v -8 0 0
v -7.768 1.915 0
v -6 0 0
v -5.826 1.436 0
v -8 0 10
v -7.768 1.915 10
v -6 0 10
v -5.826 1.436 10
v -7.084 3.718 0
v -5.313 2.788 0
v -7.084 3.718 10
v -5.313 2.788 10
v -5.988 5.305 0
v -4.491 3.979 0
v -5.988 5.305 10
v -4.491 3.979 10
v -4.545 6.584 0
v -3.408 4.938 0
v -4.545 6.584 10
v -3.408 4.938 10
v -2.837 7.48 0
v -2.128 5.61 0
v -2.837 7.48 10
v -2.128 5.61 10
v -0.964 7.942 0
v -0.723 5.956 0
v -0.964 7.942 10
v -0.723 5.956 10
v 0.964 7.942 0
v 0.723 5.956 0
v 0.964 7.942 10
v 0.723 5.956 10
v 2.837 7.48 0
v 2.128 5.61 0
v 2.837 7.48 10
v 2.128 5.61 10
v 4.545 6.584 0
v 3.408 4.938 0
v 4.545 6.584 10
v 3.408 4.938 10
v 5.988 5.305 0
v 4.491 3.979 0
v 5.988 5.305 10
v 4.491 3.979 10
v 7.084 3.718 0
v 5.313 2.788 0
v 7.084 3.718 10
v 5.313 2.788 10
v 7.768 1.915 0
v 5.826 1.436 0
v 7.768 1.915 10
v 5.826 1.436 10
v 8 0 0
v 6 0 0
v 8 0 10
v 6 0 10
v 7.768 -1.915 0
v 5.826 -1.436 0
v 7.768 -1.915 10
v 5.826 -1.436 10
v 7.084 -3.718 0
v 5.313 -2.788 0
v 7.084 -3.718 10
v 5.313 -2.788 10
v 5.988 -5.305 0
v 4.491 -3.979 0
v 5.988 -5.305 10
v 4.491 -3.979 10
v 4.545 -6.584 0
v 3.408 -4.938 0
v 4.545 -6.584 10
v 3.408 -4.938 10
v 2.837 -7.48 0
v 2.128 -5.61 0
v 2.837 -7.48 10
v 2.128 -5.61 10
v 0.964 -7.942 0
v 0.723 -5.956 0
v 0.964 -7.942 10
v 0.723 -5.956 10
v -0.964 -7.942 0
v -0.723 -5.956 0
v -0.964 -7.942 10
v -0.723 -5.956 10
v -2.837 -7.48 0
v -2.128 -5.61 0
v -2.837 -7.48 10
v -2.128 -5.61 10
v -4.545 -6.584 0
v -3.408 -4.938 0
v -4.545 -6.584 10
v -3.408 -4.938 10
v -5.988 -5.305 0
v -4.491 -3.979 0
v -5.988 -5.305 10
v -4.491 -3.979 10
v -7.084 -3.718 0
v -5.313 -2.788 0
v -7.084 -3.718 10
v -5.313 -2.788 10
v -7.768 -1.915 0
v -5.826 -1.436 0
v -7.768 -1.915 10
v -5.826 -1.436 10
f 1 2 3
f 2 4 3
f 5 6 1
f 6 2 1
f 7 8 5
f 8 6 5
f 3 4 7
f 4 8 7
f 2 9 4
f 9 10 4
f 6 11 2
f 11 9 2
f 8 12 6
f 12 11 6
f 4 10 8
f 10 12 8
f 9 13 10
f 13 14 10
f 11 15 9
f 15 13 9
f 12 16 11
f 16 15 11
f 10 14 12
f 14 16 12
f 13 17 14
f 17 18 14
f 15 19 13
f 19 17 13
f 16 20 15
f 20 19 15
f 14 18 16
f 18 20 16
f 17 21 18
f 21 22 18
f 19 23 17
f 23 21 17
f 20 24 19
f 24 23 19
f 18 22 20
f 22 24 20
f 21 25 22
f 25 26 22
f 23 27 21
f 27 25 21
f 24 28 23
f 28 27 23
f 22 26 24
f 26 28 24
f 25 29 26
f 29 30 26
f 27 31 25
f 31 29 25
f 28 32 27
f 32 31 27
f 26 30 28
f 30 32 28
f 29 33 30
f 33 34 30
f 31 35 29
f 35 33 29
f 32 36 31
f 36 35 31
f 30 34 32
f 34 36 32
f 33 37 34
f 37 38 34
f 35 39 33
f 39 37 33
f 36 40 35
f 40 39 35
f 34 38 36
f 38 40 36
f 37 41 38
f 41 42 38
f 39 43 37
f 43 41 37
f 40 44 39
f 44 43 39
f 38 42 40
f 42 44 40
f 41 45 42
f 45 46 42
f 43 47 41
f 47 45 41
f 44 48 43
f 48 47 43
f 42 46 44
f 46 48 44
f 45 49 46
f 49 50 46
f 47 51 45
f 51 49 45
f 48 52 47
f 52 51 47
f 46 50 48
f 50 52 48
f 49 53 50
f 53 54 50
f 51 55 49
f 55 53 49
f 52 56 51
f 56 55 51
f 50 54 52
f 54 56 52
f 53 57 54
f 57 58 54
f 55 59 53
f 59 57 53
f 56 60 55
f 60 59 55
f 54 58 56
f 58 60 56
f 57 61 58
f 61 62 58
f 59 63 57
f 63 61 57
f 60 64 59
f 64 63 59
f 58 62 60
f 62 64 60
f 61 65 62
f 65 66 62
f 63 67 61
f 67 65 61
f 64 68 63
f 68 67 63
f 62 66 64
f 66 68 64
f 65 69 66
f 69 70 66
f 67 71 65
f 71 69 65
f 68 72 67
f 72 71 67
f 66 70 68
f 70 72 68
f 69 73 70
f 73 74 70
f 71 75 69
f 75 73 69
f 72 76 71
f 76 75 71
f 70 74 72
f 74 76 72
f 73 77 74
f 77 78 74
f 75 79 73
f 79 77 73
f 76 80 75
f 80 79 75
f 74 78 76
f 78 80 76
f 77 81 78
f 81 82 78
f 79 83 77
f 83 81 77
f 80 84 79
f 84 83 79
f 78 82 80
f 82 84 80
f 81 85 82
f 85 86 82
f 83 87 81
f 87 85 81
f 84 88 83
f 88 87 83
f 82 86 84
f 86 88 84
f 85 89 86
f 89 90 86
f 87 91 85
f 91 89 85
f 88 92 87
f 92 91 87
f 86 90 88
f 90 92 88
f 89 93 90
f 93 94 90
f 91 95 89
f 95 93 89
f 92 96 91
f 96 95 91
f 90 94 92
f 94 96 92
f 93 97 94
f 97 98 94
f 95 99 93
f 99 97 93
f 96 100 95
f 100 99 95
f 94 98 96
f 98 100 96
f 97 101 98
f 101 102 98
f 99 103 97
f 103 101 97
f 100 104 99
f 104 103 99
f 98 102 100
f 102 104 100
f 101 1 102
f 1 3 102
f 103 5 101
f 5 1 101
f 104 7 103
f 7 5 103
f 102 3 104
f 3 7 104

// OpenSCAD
// Stage 2 of docs/audits/exact-geometry-rust.md: extrusions.
// A tube: rotate_extrude of a rectangle (two cylinders, two annuli).
// volume: 879.645943005142
rotate_extrude() translate([6, 0]) square([2, 10]);
